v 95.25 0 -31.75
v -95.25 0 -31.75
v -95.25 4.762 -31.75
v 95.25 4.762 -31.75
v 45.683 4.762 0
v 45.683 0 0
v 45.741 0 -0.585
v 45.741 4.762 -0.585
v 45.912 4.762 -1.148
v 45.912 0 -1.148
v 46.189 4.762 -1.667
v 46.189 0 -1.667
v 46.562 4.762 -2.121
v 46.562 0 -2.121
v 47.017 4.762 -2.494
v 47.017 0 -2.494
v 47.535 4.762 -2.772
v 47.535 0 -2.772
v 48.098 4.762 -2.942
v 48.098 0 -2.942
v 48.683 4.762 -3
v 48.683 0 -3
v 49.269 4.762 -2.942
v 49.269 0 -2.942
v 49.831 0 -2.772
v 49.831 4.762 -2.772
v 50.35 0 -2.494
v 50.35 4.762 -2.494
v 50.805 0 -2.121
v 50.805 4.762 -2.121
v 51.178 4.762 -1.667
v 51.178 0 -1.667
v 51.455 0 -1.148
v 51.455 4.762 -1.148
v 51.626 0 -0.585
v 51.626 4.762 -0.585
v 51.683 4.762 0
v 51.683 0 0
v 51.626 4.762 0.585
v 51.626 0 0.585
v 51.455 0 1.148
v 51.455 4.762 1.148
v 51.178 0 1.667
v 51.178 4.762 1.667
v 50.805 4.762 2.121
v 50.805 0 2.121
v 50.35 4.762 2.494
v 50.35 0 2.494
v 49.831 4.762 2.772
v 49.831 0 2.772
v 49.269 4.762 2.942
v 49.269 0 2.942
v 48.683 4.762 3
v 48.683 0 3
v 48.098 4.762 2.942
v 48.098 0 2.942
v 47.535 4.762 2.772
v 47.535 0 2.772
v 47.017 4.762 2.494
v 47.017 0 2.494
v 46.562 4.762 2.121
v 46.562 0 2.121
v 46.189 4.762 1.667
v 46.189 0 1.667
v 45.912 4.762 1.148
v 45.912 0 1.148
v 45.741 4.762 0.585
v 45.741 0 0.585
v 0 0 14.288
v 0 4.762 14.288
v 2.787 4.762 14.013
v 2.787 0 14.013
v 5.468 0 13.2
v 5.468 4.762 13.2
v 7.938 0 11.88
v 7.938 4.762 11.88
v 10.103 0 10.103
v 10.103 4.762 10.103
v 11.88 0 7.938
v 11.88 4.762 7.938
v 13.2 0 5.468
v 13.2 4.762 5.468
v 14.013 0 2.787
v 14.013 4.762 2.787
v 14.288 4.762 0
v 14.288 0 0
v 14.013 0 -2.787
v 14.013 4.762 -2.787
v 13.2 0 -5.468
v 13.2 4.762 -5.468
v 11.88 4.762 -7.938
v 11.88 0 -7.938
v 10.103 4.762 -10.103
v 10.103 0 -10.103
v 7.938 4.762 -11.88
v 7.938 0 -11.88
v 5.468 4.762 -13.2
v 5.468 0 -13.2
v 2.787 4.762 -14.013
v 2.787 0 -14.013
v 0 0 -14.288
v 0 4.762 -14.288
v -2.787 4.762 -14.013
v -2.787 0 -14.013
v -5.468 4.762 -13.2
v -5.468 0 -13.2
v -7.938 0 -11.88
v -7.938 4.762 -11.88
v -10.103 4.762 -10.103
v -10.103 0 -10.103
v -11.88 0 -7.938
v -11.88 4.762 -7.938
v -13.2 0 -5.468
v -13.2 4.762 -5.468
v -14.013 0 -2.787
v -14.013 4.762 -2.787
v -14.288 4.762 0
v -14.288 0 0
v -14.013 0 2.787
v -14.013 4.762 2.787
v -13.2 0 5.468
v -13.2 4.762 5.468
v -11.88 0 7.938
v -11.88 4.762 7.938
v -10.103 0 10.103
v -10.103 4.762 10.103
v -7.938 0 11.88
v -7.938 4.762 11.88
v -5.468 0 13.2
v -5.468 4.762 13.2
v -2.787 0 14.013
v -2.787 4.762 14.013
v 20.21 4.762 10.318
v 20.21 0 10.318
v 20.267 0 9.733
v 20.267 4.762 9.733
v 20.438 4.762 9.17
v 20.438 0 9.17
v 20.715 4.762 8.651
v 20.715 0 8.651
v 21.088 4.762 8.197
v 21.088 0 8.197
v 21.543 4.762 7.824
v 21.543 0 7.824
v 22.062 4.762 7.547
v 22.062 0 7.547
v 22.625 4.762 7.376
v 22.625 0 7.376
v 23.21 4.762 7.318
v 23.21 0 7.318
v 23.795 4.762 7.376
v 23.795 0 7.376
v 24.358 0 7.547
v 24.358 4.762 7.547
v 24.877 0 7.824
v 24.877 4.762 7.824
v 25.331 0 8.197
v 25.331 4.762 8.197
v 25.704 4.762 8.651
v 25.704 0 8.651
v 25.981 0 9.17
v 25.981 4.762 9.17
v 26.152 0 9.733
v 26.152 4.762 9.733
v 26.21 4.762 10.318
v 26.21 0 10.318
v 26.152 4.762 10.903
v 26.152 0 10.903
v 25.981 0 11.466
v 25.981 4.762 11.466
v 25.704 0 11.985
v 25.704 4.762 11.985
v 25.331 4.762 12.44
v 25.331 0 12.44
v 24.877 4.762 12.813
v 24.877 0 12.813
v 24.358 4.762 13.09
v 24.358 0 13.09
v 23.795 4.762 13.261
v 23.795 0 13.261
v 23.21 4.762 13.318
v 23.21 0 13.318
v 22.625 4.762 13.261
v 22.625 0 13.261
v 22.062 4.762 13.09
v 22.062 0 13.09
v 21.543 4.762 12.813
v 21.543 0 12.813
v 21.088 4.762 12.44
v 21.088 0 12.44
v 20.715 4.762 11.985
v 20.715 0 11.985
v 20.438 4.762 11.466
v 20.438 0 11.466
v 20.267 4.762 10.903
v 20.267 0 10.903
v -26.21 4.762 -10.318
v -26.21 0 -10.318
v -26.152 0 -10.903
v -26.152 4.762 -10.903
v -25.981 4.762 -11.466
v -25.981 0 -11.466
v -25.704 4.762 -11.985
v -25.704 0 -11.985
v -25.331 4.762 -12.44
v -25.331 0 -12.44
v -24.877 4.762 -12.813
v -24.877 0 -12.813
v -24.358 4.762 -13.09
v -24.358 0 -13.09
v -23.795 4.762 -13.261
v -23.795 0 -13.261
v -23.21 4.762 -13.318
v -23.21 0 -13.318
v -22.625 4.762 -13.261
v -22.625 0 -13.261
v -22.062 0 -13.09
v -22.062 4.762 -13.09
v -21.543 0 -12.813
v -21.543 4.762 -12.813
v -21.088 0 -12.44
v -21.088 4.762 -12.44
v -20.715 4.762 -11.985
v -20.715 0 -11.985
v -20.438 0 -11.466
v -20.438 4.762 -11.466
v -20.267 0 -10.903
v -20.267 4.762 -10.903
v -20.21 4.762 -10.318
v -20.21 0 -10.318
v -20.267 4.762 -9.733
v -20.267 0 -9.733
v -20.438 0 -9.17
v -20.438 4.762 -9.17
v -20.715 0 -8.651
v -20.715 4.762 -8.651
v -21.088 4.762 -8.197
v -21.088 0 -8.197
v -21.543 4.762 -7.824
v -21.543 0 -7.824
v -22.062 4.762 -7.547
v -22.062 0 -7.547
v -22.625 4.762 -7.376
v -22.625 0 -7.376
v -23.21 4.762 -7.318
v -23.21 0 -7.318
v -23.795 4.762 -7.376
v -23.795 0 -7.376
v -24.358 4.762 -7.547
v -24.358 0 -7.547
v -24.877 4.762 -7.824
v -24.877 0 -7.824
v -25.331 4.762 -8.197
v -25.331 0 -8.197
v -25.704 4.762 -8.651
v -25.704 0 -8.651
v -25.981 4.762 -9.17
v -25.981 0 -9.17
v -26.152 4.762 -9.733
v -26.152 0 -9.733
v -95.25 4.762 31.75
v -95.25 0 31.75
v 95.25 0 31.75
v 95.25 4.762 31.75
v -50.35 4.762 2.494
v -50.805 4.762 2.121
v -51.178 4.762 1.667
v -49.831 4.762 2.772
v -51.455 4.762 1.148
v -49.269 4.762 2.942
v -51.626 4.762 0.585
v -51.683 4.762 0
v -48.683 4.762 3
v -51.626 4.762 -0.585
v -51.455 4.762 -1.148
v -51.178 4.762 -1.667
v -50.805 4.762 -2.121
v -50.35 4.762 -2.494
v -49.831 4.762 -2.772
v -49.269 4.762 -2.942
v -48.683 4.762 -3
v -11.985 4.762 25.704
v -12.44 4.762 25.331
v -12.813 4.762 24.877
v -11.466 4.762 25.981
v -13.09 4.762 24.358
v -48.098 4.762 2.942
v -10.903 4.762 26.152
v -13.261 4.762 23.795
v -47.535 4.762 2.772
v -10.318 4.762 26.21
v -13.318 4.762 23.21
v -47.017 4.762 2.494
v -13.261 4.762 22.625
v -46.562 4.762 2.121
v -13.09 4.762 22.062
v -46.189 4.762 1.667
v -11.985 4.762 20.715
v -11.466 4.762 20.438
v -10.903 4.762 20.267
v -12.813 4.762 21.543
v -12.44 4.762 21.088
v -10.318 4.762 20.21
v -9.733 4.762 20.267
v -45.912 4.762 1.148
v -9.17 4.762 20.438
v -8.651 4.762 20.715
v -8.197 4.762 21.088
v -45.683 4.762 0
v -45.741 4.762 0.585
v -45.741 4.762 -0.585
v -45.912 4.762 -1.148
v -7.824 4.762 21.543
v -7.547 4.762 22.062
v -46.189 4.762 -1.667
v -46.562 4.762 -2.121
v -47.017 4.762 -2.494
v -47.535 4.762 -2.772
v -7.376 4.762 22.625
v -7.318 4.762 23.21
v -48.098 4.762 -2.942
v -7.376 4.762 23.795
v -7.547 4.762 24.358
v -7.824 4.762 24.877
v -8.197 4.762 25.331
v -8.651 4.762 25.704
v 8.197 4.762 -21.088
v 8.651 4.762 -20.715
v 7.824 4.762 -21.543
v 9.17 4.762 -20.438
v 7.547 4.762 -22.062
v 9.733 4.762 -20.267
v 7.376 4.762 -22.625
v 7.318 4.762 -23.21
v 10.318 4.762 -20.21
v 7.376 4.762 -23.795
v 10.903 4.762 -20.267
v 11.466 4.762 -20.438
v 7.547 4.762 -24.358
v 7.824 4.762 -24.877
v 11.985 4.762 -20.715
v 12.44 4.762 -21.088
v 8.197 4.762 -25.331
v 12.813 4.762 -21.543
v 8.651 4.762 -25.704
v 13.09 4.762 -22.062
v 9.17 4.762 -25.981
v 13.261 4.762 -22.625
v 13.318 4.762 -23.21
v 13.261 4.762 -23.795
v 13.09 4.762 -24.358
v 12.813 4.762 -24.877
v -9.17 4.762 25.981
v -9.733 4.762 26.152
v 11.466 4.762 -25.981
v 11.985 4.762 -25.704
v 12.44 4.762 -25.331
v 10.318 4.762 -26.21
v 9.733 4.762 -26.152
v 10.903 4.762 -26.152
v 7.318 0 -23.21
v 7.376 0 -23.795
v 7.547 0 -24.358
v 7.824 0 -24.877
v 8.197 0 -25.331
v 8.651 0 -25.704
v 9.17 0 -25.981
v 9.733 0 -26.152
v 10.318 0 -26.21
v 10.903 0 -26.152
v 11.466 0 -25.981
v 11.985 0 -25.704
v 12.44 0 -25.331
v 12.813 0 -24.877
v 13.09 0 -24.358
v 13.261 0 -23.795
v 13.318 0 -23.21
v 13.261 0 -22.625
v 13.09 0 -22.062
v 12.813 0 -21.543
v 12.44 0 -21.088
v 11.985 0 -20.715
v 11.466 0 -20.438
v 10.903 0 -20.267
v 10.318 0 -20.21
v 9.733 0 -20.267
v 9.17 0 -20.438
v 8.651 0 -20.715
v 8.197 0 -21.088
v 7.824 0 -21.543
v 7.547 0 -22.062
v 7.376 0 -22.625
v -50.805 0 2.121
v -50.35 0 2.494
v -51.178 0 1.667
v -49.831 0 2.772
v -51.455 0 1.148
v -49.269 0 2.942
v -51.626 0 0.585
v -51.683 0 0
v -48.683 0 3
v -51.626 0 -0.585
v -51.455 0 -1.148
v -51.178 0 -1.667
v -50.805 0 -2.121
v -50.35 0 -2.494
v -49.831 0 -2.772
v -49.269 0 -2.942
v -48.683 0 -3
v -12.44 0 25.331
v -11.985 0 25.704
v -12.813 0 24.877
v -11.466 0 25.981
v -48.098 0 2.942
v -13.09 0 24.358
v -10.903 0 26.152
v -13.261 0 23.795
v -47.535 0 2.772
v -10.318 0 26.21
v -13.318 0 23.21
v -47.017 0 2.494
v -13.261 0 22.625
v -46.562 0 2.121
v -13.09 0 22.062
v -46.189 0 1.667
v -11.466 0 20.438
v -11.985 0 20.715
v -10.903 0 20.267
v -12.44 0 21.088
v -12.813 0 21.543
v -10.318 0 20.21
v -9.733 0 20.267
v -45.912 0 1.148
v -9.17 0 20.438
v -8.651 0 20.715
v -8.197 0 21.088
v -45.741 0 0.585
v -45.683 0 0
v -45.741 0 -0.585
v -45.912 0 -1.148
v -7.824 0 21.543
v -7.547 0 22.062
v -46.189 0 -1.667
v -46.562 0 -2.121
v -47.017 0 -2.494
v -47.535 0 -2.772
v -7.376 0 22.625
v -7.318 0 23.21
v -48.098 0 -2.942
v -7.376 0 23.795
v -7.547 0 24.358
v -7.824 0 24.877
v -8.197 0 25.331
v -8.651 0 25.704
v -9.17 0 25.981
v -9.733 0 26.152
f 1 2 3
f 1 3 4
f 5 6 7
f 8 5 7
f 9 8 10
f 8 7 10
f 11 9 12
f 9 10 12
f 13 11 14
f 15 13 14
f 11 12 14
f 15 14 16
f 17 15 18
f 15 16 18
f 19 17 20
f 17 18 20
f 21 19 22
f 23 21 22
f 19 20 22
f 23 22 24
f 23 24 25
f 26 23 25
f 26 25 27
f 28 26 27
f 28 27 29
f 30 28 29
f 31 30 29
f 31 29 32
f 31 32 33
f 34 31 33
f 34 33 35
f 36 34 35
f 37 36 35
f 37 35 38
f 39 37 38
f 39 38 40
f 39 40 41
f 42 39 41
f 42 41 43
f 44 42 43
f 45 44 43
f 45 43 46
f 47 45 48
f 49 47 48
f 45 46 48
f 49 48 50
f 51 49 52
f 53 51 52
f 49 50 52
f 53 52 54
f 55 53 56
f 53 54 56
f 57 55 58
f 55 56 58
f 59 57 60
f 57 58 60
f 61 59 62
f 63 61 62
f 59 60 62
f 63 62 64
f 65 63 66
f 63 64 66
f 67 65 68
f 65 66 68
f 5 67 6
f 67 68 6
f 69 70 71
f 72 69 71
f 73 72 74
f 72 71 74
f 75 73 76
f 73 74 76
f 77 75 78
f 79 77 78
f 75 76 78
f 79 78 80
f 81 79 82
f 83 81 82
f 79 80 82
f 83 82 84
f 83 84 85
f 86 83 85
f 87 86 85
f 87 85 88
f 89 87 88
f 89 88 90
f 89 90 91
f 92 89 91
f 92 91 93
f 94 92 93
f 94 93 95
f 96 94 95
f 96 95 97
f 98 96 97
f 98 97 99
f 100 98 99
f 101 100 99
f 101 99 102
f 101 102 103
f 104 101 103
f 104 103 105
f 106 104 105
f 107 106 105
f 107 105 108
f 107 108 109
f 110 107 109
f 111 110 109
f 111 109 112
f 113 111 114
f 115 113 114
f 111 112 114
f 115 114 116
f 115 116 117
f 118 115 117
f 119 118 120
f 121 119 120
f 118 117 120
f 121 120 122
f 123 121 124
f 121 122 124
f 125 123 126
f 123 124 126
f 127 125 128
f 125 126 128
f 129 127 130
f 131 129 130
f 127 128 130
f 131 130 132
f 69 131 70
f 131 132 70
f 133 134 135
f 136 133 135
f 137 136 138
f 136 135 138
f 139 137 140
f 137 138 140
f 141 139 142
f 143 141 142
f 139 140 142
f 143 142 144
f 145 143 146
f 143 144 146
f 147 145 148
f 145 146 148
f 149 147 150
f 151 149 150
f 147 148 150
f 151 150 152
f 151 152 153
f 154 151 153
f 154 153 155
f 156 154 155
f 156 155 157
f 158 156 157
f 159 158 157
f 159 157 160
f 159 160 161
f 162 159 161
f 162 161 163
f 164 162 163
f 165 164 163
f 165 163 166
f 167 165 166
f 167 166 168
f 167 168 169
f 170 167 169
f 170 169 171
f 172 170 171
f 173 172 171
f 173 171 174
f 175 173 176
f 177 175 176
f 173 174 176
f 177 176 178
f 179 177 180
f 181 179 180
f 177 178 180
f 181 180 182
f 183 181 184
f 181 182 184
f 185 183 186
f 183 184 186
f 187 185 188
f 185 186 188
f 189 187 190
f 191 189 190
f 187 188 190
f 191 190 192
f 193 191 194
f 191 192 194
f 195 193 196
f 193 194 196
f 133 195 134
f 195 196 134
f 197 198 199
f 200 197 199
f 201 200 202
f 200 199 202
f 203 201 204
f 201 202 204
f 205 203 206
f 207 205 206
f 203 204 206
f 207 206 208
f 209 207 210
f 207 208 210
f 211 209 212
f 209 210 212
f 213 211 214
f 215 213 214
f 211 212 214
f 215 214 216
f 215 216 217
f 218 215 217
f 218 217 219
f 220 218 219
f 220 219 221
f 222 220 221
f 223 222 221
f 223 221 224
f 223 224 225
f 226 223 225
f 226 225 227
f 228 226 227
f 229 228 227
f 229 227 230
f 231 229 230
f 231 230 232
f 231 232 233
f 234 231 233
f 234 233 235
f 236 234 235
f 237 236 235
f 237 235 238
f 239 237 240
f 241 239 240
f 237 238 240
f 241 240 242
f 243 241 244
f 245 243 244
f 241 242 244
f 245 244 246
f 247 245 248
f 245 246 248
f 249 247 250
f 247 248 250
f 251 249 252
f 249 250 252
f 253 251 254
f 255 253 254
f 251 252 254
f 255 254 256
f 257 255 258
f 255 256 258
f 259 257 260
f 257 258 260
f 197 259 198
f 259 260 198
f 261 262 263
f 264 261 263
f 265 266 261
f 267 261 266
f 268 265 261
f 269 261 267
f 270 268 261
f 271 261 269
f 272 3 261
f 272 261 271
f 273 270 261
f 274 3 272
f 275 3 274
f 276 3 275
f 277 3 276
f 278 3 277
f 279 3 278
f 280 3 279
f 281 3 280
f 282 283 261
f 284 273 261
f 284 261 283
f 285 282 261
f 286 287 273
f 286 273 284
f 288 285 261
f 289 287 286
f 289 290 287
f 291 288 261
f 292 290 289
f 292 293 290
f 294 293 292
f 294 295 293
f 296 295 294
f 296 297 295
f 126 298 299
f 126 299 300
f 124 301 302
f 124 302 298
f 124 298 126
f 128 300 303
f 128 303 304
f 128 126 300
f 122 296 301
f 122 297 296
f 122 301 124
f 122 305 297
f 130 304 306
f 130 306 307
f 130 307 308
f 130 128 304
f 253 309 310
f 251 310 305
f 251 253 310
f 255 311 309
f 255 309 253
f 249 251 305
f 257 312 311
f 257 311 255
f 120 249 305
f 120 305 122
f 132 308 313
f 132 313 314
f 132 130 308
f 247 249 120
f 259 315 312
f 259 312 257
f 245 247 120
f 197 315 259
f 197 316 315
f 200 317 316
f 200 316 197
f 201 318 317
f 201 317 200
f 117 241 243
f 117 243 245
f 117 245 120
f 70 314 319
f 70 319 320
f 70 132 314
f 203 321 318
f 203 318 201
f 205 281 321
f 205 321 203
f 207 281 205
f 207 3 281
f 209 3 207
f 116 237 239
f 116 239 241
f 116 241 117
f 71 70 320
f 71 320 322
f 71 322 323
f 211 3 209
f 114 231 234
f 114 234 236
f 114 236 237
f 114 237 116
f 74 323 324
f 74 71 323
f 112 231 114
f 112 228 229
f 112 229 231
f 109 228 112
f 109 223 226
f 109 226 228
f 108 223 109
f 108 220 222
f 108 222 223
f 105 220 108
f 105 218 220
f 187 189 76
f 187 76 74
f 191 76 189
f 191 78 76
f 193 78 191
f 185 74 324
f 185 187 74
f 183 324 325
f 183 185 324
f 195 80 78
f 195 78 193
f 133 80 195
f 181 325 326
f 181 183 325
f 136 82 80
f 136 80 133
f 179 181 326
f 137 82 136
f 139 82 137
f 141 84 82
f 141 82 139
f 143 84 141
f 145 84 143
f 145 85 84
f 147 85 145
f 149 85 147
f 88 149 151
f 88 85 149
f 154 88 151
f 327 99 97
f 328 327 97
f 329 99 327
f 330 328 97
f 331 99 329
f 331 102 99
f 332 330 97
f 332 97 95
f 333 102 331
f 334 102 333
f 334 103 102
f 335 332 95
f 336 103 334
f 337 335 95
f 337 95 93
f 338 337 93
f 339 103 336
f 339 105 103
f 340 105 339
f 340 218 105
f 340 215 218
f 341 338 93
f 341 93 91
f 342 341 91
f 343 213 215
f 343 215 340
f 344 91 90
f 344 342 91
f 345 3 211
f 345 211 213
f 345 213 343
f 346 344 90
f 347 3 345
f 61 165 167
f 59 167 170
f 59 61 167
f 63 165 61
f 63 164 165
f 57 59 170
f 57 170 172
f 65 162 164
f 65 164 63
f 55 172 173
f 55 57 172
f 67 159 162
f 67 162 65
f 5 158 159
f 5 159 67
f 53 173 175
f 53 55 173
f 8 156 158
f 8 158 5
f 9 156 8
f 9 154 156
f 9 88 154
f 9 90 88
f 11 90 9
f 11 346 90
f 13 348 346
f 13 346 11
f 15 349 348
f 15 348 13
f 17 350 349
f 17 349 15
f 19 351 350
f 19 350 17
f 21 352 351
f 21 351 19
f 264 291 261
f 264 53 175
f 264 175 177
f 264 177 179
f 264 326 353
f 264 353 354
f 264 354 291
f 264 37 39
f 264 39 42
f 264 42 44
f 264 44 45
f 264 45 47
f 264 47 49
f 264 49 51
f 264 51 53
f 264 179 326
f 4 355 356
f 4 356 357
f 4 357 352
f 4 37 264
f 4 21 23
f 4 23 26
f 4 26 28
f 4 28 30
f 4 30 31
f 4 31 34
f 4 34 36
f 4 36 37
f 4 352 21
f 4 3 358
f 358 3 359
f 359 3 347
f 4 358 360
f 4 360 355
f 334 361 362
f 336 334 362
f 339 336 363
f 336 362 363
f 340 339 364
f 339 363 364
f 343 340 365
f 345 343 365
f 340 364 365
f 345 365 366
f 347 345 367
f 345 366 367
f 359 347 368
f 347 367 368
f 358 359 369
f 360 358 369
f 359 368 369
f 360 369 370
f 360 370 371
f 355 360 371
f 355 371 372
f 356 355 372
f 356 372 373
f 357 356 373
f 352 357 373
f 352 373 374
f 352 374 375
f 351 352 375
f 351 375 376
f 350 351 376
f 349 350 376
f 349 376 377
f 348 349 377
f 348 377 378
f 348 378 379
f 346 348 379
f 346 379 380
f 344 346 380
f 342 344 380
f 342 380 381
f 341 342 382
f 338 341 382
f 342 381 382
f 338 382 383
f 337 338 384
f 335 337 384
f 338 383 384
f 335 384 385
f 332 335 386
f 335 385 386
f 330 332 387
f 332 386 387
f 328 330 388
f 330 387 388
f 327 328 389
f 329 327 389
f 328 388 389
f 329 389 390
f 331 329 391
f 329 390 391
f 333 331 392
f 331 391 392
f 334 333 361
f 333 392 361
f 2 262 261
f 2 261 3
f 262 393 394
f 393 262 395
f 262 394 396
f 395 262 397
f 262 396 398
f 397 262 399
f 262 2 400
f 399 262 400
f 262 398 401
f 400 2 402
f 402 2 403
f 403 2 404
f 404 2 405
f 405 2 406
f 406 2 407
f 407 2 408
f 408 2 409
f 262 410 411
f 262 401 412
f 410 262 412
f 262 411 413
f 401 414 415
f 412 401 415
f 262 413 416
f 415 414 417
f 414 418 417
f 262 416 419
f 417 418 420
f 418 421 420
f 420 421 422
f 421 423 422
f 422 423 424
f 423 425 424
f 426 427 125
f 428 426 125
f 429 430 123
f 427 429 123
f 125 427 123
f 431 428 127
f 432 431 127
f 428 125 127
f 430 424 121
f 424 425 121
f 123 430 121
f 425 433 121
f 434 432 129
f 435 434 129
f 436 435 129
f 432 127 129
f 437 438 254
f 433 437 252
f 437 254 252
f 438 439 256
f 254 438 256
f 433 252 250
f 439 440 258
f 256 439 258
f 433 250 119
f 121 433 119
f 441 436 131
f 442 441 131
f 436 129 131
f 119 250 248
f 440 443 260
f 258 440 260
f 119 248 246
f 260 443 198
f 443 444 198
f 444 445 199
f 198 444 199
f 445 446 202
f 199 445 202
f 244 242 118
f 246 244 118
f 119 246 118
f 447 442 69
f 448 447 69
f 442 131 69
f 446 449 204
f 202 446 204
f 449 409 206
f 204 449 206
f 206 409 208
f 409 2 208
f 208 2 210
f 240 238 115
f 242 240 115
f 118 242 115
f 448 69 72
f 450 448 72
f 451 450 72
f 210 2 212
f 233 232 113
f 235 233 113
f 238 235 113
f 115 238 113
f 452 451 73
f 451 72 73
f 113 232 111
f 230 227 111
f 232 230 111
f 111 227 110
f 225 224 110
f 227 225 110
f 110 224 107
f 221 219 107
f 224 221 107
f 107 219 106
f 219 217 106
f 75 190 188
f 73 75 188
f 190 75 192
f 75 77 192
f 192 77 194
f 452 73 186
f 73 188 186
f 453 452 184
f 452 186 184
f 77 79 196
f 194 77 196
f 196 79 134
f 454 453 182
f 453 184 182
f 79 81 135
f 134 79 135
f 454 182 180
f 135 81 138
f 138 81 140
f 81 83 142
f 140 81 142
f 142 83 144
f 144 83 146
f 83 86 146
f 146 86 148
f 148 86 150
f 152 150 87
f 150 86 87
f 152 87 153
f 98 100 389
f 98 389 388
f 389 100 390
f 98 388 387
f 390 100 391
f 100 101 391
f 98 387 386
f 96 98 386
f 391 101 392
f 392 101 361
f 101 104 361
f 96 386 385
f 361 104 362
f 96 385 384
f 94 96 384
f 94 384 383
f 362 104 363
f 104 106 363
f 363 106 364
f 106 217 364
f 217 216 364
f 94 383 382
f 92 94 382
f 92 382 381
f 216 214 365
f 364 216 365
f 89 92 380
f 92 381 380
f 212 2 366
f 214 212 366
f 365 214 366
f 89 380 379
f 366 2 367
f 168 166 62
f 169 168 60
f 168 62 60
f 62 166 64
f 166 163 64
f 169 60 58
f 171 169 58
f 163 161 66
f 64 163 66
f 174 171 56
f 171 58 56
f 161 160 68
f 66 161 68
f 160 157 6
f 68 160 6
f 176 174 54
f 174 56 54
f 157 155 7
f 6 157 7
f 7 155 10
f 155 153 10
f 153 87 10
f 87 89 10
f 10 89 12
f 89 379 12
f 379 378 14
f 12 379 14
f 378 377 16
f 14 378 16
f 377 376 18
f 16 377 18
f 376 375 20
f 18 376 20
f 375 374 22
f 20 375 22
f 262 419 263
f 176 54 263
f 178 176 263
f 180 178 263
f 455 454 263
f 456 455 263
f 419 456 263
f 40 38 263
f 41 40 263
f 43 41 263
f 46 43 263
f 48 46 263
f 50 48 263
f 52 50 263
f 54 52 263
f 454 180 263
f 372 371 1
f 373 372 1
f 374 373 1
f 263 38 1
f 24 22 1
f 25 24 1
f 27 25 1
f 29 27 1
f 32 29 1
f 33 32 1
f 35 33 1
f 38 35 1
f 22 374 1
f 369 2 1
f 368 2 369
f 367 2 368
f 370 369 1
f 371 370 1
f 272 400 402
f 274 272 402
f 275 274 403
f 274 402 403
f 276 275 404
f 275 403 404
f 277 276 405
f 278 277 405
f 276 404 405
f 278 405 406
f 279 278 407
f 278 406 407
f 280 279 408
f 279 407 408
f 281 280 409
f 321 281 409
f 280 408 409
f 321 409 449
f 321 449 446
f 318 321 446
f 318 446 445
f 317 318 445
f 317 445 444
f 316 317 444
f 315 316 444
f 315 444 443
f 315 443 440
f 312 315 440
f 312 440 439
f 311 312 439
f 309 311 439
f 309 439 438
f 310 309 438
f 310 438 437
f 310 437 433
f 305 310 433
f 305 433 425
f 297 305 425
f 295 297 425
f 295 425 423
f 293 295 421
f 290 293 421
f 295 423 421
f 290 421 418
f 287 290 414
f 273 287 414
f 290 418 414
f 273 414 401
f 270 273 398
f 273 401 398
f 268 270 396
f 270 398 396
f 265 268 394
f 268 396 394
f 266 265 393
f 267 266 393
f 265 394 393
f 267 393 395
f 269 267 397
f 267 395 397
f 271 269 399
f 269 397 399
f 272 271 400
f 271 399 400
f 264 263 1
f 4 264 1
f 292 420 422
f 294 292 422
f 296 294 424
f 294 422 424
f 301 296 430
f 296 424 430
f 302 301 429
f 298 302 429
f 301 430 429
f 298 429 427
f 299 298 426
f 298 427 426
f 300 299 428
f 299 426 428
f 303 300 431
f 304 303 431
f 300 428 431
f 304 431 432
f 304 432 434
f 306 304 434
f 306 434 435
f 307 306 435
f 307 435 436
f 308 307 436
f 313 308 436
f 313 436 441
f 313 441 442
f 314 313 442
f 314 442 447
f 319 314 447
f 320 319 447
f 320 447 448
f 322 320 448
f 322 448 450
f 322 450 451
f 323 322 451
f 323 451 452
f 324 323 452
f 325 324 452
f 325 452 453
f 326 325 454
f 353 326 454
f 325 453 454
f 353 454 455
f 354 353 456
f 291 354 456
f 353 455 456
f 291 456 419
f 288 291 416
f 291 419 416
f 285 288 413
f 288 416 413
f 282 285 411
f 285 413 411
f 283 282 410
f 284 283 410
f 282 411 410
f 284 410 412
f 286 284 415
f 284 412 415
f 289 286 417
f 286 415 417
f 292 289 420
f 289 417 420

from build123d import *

# Parameters (mm, degrees)
SKETCH1_W                = 190.5
SKETCH1_H                = 63.5
BOSS_EXTRUDE1_DEPTH      = 4.7625
SKETCH3_R                = 14.2875
CUT_EXTRUDE1_DEPTH       = 101.515204851
F_6_0_6_DIAMETER_HOLE1_D = 6


with BuildPart() as part:
    # Sketch1 → Boss-Extrude1 (new body)
    with BuildSketch(Plane(origin=(0, 0, 0), x_dir=(1, 0, 0), z_dir=(0, 1, 0))):
        Rectangle(SKETCH1_W, SKETCH1_H)
    extrude(amount=BOSS_EXTRUDE1_DEPTH)

    # Sketch3 → Cut-Extrude1 (cut, through all)
    with BuildSketch(Plane(origin=(0, 4.7625, 0), x_dir=(1, 0, 0), z_dir=(0, 1, 0))):
        with Locations(Location((0, 0, 0), (0, 0, 270))):
            Circle(SKETCH3_R)
    extrude(amount=-CUT_EXTRUDE1_DEPTH, mode=Mode.SUBTRACT)

    # Ø6.0 (6) Diameter Hole1 (through all)
    with Locations(Plane(origin=(0, 4.7625, 0), x_dir=(1, 0, 0), z_dir=(0, 1, 0))):
        with Locations((-23.209797391, 10.318202609), (-10.318202609, -23.209797391), (10.318202609, 23.209797391), (23.209797391, -10.318202609), (-48.683333333, 0), (48.683333333, 0)):
            Hole(F_6_0_6_DIAMETER_HOLE1_D / 2)


solid = part.part
